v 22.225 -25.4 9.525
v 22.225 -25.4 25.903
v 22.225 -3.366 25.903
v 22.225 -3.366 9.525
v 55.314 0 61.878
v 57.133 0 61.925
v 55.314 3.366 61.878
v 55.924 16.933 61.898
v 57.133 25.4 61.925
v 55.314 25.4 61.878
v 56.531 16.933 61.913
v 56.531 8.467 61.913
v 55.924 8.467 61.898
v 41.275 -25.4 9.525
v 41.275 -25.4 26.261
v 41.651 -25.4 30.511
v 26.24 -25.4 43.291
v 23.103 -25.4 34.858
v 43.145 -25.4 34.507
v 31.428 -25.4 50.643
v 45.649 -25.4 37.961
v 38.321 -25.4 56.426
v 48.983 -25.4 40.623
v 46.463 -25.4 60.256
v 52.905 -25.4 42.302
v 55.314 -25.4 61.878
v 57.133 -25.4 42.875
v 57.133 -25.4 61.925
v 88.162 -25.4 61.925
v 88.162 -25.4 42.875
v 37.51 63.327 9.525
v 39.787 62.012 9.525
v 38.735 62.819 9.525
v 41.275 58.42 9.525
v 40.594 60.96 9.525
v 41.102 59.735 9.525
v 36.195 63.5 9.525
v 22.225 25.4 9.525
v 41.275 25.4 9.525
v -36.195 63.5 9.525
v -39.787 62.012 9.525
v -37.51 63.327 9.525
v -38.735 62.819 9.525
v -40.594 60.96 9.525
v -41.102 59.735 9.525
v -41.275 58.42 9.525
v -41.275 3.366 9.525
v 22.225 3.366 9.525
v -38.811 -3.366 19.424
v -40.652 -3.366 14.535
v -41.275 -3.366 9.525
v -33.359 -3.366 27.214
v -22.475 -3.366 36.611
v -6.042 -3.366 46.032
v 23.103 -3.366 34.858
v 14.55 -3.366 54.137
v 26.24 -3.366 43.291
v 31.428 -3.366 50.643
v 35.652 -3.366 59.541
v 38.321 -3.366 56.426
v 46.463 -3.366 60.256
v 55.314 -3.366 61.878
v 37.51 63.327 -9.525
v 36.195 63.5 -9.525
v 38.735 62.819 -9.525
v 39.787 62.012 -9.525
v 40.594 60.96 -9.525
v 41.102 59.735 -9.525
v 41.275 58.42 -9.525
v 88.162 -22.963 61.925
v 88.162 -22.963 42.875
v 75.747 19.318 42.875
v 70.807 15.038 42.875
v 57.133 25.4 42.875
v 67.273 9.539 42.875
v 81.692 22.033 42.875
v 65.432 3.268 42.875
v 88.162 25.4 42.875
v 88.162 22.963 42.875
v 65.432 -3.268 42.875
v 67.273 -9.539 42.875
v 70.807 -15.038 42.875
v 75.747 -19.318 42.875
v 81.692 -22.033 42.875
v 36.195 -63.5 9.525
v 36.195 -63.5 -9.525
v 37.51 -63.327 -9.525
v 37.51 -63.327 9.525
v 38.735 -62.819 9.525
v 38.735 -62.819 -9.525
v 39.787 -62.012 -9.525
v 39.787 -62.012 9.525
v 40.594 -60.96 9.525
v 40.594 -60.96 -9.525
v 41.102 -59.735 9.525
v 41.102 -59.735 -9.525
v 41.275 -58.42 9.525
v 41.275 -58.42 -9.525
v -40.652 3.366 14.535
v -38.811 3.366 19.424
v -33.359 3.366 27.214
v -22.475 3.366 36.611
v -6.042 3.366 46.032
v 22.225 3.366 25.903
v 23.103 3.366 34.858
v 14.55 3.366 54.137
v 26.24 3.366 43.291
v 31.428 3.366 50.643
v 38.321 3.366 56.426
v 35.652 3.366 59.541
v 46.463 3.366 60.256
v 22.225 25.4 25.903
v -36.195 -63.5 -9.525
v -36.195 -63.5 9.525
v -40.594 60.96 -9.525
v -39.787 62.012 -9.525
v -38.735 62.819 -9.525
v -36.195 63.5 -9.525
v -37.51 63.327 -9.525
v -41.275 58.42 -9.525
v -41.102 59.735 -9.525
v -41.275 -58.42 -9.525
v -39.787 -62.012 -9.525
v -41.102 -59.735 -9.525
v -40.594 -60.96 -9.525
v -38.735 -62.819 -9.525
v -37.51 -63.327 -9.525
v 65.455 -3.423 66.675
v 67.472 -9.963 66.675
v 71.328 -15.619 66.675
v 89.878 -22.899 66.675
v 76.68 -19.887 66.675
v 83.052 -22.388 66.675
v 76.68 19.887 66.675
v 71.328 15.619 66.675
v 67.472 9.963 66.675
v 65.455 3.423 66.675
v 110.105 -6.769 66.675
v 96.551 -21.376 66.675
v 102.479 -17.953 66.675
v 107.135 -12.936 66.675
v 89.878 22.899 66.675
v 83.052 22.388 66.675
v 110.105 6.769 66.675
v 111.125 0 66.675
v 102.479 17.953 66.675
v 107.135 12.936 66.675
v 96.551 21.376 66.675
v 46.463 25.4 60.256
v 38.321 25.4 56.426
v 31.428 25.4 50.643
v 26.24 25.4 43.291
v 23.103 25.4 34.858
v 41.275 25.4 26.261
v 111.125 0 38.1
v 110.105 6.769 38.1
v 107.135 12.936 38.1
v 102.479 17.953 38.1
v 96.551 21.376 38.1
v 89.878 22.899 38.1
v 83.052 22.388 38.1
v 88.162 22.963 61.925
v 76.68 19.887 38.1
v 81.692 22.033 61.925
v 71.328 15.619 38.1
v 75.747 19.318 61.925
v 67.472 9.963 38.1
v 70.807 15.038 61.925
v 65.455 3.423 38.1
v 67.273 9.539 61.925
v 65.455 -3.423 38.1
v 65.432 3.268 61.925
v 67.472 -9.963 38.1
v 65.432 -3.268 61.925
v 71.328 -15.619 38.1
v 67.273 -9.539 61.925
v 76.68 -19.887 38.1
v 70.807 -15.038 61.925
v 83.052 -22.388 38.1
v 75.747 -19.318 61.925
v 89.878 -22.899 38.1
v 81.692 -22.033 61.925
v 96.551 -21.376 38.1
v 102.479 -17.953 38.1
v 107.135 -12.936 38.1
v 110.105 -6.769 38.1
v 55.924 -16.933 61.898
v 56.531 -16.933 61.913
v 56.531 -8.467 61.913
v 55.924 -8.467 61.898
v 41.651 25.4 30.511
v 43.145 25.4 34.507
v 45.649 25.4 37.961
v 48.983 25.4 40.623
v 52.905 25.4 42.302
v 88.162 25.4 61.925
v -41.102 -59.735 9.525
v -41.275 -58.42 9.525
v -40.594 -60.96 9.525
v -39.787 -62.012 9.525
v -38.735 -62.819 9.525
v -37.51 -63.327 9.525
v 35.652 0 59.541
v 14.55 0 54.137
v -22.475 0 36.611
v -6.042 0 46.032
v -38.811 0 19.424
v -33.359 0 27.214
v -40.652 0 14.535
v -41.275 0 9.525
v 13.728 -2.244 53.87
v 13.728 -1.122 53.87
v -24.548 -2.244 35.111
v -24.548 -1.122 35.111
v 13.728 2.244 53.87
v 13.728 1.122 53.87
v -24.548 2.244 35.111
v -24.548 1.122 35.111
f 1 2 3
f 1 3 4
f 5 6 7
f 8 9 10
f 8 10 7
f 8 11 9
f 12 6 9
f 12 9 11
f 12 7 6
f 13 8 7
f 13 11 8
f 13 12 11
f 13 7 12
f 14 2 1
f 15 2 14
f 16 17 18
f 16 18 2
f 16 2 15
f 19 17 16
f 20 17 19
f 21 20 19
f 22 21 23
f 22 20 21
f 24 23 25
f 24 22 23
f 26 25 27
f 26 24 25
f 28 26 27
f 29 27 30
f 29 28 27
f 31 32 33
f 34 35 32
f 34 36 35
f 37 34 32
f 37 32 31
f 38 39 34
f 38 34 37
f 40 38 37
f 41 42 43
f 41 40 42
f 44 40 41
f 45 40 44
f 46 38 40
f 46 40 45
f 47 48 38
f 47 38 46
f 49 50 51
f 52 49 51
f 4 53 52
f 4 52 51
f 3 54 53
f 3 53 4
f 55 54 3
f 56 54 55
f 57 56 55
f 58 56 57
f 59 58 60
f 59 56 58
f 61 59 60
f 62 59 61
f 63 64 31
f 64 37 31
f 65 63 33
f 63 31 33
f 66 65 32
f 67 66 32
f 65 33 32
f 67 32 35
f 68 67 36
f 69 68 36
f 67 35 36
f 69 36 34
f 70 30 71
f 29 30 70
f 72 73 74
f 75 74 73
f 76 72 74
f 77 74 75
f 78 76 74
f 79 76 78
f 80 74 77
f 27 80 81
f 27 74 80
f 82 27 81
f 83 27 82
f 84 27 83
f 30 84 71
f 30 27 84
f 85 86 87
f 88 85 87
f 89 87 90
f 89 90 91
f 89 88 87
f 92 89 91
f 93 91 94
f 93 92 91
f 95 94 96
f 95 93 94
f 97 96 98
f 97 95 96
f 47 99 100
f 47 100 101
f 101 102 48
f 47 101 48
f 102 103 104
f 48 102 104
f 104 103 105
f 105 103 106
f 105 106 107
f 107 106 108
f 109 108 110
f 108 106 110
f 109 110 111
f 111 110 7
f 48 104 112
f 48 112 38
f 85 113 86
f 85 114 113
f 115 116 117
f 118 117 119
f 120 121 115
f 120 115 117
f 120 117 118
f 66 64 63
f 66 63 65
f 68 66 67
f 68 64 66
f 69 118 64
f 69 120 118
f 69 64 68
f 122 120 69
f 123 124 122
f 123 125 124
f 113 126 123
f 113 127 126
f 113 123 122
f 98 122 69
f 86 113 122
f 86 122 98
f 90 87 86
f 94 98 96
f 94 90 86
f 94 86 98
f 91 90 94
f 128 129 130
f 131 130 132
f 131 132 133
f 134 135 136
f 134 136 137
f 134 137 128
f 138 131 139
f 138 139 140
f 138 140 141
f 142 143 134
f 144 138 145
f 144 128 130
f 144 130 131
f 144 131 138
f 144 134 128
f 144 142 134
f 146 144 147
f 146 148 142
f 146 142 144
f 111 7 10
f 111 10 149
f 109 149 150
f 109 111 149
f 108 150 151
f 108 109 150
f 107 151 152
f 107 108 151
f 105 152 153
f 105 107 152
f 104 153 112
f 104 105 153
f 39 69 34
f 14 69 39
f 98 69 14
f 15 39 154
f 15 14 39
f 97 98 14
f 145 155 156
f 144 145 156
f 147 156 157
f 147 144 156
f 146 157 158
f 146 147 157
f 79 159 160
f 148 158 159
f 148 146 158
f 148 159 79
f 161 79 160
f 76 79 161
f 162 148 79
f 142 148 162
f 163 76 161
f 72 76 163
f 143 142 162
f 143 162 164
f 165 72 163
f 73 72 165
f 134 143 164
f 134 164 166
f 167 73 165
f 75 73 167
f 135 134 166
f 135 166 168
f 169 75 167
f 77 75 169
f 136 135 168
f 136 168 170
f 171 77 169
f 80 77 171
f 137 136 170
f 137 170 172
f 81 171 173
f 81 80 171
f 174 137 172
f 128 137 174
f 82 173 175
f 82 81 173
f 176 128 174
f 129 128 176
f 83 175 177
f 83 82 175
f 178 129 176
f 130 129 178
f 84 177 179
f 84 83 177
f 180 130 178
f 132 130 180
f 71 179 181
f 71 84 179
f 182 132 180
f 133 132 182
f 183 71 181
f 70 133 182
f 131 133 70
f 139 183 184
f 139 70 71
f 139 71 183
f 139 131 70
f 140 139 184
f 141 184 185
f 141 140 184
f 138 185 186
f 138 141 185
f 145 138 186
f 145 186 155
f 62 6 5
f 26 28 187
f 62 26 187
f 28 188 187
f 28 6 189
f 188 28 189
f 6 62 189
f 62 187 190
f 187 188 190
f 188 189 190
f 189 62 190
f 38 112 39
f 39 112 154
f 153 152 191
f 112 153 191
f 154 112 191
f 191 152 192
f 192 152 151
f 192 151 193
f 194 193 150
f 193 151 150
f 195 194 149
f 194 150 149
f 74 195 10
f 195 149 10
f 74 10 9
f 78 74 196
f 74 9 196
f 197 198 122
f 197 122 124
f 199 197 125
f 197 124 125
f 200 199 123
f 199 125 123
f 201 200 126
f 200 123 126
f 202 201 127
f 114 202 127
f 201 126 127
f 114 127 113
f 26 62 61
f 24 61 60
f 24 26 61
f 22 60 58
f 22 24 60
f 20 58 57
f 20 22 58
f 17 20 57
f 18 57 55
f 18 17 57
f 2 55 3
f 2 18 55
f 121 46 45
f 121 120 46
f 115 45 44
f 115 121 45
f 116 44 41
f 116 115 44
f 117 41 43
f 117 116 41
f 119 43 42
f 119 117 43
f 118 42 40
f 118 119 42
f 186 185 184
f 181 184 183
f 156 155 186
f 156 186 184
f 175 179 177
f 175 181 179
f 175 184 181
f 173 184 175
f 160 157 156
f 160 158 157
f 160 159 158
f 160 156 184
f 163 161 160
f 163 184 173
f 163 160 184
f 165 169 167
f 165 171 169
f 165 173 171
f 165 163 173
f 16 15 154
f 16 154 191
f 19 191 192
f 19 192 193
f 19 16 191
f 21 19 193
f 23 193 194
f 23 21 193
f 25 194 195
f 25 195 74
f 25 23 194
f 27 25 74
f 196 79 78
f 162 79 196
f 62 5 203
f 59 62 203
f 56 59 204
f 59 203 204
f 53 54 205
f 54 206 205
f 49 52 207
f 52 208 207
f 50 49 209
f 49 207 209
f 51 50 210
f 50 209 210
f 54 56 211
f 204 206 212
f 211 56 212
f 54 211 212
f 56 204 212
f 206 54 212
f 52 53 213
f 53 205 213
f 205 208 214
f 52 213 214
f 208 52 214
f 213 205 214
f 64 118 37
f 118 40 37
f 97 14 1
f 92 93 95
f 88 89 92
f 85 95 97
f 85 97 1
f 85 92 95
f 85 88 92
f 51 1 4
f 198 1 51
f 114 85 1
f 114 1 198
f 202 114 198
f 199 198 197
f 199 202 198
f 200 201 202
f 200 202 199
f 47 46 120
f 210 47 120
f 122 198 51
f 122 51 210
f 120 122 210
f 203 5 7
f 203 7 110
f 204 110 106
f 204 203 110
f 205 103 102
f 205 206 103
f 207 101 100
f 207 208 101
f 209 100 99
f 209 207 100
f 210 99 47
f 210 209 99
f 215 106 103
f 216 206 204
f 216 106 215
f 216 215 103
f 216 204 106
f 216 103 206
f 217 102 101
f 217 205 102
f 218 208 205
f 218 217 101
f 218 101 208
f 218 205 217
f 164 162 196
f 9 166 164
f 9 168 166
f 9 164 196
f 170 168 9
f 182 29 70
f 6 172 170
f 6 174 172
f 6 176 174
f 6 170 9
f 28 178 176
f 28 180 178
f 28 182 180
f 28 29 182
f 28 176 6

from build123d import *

# Parameters (mm, degrees)
F1_DEPTH = 63.5
F0_W     = 27.836654
F0_H     = 19.05
F2_DEPTH = 25.4
F3_DEPTH = 3.3655
F4_R     = 5.08


with BuildPart() as f1:
    # F0 (on Front) → F1 (new body, symmetric)
    with BuildSketch(Plane.XZ):
        Polygon((22.225, 9.525), (-41.275, 9.525), (-41.275, -9.525), (41.275, -9.525), (41.275, 9.525), align=None)
    extrude(amount=F1_DEPTH, both=True)

    # F0 (on Front) → F2 (join, symmetric)
    with BuildSketch(Plane.XZ):
        with BuildLine():
            Line((22.225, 25.90316), (22.225, 9.525))
            Line((22.225, 9.525), (41.275, 9.525))
            Line((41.275, 9.525), (41.275, 26.260685))
            ThreePointArc((41.275, 26.260685), (45.648964, 37.960944), (57.132766, 42.8752))
            Line((57.132766, 42.8752), (60.325, 42.8752))
            Line((60.325, 42.8752), (60.325, 61.9252))
            Line((60.325, 61.9252), (57.132766, 61.9252))
            add(Edge.make_bspline(
                [(57.132766, 61.9252), (56.532725, 61.915433), (55.926231, 61.899604), (55.313651, 61.877792)],
                knots=[0, 0, 0, 0, 1.808043, 1.808043, 1.808043, 1.808043], degree=3))
            ThreePointArc((55.313651, 61.877792), (31.427523, 50.643299), (22.225, 25.90316))
        make_face()
        with Locations((74.243327, 52.4002)):
            Rectangle(F0_W, F0_H)
    extrude(amount=F2_DEPTH, both=True)

    # F0 (on Front) → F3 (join, symmetric)
    with BuildSketch(Plane.XZ):
        with BuildLine():
            add(Edge.make_bspline(
                [(55.313651, 61.877792), (18.152726, 60.55465), (-41.403137, 37.216185), (-41.275, 9.525)],
                knots=[1.808043, 1.808043, 1.808043, 1.808043, 111.489324, 111.489324, 111.489324, 111.489324], degree=3))
            Line((-41.275, 9.525), (22.225, 9.525))
            Line((22.225, 9.525), (22.225, 25.90316))
            ThreePointArc((22.225, 25.90316), (31.427523, 50.643299), (55.313651, 61.877792))
        make_face()
    extrude(amount=F3_DEPTH, both=True)

    # F4
    f4_edges = [f1.edges().sort_by_distance(p)[0] for p in [
        (41.275, -63.5, 0),
        (-41.275, -63.5, 0),
        (41.275, 63.5, 0),
        (-41.275, 63.5, 0),
    ]]
    fillet(f4_edges, radius=F4_R)

    # F0 (on Front) → F5 (revolve)
    with BuildSketch(Plane.XZ):
        Polygon((88.161654, 66.675), (88.161654, 61.9252), (88.161654, 42.8752), (88.161654, 38.1), (111.125, 38.1), (111.125, 66.675), align=None)
    revolve(axis=Axis((88.161654, 0, 52.4002), (0, 0, 1)))


solid = f1.part
